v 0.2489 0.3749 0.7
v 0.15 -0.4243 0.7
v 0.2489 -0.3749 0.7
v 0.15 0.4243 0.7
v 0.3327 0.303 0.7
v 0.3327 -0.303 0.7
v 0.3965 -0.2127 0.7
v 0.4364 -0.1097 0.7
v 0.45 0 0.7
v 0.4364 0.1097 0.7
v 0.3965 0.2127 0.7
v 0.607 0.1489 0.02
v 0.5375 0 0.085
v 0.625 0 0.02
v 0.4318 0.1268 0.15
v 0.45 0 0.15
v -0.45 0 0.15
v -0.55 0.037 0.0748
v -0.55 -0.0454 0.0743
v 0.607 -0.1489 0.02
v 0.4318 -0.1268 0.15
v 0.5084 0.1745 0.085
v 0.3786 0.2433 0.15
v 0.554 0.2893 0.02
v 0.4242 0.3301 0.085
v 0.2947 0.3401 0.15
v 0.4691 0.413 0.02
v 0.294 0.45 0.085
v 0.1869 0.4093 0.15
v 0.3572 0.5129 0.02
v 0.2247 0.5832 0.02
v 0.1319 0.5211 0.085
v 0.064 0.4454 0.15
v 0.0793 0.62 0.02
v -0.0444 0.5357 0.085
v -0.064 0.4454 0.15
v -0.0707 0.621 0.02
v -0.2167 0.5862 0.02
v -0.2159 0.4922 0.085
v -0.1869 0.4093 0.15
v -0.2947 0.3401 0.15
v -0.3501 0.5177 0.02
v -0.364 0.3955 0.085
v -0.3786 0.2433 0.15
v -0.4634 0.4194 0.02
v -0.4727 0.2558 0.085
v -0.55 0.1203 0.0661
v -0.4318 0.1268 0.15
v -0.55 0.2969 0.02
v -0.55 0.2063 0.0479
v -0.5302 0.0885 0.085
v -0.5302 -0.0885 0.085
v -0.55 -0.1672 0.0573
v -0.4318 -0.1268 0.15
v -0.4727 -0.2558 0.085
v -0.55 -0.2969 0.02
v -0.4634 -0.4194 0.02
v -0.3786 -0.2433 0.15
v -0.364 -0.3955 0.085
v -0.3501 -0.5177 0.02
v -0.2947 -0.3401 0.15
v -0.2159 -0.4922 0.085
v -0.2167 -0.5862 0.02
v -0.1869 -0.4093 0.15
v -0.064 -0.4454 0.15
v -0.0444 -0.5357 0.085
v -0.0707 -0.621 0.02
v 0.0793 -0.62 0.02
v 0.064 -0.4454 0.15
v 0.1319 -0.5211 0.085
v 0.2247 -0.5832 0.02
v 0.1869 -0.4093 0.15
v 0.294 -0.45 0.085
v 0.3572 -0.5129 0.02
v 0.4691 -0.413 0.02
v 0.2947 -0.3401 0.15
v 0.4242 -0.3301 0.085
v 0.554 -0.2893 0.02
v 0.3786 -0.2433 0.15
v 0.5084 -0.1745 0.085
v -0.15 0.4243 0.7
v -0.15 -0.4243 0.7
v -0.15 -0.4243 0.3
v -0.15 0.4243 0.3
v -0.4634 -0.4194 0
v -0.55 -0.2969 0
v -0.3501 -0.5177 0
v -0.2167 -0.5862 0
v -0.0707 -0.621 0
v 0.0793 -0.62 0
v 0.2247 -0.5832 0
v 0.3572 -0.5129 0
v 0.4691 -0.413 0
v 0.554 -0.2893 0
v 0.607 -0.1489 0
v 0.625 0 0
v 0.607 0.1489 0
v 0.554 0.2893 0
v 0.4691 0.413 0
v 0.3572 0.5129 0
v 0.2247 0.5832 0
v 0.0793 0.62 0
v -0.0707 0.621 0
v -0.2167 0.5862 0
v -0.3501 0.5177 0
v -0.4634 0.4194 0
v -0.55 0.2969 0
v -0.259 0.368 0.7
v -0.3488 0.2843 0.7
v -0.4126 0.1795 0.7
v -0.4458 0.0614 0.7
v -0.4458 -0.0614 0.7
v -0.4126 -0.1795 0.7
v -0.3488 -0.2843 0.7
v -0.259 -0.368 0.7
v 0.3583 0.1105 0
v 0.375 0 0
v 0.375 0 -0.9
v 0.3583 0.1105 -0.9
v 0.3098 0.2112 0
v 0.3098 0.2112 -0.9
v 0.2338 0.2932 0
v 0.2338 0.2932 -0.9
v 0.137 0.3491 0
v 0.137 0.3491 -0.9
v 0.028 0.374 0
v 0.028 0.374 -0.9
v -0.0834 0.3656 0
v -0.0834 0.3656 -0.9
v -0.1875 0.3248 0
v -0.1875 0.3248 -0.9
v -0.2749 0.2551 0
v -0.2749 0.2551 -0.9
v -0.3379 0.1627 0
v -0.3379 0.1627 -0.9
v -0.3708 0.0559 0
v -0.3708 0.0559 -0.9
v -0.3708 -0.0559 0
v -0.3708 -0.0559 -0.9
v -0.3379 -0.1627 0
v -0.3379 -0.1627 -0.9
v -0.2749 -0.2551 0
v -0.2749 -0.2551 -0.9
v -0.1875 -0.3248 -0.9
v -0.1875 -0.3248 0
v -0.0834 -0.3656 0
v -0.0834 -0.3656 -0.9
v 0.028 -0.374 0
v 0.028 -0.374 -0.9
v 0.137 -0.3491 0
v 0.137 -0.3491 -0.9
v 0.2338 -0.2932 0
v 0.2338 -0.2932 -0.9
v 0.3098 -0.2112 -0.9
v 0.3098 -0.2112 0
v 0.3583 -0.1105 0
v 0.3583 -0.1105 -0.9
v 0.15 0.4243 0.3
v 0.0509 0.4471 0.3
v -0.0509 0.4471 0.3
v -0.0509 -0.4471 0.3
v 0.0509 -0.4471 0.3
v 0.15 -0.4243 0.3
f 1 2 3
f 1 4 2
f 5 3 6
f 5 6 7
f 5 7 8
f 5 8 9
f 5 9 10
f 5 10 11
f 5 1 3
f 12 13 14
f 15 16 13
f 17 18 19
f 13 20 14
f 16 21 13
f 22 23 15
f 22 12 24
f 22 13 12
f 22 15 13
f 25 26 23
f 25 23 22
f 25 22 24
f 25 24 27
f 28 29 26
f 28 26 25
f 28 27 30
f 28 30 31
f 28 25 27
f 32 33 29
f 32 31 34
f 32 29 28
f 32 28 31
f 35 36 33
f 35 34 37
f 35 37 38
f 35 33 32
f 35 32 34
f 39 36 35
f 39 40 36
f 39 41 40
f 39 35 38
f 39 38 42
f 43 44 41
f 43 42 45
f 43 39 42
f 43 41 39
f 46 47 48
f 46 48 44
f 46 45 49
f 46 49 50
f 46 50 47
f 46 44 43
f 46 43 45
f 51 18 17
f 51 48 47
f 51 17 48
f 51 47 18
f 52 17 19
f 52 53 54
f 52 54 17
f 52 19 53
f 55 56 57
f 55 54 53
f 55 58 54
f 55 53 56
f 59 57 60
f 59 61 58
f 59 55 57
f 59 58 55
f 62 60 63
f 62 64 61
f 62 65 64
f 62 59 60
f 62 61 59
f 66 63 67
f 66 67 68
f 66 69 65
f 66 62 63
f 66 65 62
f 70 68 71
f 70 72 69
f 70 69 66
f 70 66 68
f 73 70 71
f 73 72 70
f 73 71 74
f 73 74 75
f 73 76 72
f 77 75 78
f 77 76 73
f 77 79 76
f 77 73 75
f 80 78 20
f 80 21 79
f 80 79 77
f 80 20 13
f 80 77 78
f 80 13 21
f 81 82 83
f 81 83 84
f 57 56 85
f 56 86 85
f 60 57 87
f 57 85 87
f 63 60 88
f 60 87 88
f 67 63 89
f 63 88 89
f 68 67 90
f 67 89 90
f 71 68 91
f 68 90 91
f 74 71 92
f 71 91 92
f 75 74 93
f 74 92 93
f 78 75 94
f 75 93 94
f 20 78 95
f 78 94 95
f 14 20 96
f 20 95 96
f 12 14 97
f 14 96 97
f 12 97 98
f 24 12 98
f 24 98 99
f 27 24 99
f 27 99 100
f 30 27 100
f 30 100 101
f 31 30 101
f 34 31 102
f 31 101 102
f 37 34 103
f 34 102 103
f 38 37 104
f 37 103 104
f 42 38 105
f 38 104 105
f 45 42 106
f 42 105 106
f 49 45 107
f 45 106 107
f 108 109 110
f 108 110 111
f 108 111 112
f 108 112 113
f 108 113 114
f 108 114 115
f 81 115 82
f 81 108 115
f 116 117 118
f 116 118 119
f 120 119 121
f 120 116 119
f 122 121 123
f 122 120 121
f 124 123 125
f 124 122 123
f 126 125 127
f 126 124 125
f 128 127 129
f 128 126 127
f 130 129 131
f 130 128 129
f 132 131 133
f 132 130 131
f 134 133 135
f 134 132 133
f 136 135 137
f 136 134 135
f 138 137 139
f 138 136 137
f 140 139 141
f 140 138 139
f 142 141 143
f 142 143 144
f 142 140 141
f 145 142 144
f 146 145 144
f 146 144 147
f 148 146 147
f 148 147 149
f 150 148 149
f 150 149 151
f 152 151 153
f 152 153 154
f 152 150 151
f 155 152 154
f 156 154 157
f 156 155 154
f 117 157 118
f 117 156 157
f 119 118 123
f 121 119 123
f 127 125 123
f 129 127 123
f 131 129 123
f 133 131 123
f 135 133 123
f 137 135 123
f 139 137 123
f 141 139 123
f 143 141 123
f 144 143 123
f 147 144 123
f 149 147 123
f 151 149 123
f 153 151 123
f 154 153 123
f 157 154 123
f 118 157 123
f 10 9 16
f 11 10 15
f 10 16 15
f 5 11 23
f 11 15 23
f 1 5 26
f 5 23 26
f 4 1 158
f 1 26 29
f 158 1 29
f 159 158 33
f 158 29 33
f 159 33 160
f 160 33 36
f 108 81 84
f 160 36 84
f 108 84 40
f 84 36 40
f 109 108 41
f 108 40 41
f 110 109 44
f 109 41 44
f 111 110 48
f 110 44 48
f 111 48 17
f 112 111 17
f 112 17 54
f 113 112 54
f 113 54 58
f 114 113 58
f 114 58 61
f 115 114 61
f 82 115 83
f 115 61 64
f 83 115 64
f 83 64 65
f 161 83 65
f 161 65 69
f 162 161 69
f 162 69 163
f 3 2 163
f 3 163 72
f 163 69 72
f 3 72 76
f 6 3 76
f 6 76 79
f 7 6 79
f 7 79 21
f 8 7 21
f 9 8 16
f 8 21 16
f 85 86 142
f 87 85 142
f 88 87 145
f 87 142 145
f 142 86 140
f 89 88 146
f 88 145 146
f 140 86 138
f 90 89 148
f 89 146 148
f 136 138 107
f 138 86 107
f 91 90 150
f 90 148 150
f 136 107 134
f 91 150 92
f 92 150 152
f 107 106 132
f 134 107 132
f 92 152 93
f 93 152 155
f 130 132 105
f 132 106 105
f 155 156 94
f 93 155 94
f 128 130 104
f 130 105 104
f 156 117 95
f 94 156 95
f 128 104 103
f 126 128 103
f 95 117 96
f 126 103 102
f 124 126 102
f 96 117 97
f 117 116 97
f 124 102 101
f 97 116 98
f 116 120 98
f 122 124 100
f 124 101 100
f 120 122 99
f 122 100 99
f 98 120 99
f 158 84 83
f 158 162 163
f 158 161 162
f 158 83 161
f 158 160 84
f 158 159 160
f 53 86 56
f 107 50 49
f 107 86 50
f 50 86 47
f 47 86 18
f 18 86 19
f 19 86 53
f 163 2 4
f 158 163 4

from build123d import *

# Parameters (mm, degrees)
SKETCH1_R               = 0.375
BOSS_EXTRUDE1_DEPTH     = 0.9
SKETCH2_R               = 0.625
BOSS_EXTRUDE2_DEPTH     = 0.15
SKETCH3_R               = 0.45
BOSS_EXTRUDE3_DEPTH     = 0.55
SKETCH4_W               = 0.3
SKETCH4_H               = 1.514088174
CUT_EXTRUDE1_DEPTH      = 0.4
CHAMFER1_SIZE           = 0.13
CHAMFER1_SIZE_2         = 0.175
CUT_EXTRUDE2_DEPTH      = 2.261447581
CUT_EXTRUDE2_DEPTH_BACK = 2.261447581
SKETCH5_W               = 0.405583523
SKETCH5_H               = 1.586532149


with BuildPart() as part:
    # Sketch1 → Boss-Extrude1 (new body)
    with BuildSketch(Plane.XY):
        Circle(SKETCH1_R)
    extrude(amount=-BOSS_EXTRUDE1_DEPTH)

    # Sketch2 → Boss-Extrude2 (add)
    with BuildSketch(Plane.XY):
        Circle(SKETCH2_R)
    extrude(amount=BOSS_EXTRUDE2_DEPTH)

    # Sketch3 → Boss-Extrude3 (add)
    with BuildSketch(Plane.XY.offset(0.15)):
        Circle(SKETCH3_R)
    extrude(amount=BOSS_EXTRUDE3_DEPTH)

    # Sketch4 → Cut-Extrude1 (cut)
    with BuildSketch(Plane.XY.offset(0.7)):
        with Locations((0, -0.021514413)):
            Rectangle(SKETCH4_W, SKETCH4_H)
    extrude(amount=-CUT_EXTRUDE1_DEPTH, mode=Mode.SUBTRACT)

    # Chamfer1
    # the kernel refuses this chamfer: 0.175, 0.13 mm, written as the material it takes off along each edge
    with BuildSketch(Plane(origin=(0, 0, 0.15), x_dir=(1, 0, 0), z_dir=(0, -1, 0))) as chamfer1_piece_1_section:
        Polygon((0.625, -CHAMFER1_SIZE), (0.625 - CHAMFER1_SIZE_2, 0), (0.625, 0), align=None)
    chamfer1_piece_1 = revolve(axis=Axis((0, 0, 0.15), (0, 0, 1)), mode=Mode.PRIVATE)
    chamfer1_piece_1 = chamfer1_piece_1 - Plane(origin=(0, 0, 0.085771978), x_dir=(1, 0, 0), z_dir=(0, 0, -1)) * Cylinder(0.45, 3, mode=Mode.PRIVATE)
    add(chamfer1_piece_1, mode=Mode.SUBTRACT)

    # Sketch5 → Cut-Extrude2 (cut, two sides: drawn at the far end of the back side and taken through both)
    with BuildSketch(Plane.XY.offset(-CUT_EXTRUDE2_DEPTH_BACK)):
        with Locations((-0.752791762, 0.000920374)):
            Rectangle(SKETCH5_W, SKETCH5_H)
    extrude(amount=CUT_EXTRUDE2_DEPTH + CUT_EXTRUDE2_DEPTH_BACK, mode=Mode.SUBTRACT)


solid = part.part
